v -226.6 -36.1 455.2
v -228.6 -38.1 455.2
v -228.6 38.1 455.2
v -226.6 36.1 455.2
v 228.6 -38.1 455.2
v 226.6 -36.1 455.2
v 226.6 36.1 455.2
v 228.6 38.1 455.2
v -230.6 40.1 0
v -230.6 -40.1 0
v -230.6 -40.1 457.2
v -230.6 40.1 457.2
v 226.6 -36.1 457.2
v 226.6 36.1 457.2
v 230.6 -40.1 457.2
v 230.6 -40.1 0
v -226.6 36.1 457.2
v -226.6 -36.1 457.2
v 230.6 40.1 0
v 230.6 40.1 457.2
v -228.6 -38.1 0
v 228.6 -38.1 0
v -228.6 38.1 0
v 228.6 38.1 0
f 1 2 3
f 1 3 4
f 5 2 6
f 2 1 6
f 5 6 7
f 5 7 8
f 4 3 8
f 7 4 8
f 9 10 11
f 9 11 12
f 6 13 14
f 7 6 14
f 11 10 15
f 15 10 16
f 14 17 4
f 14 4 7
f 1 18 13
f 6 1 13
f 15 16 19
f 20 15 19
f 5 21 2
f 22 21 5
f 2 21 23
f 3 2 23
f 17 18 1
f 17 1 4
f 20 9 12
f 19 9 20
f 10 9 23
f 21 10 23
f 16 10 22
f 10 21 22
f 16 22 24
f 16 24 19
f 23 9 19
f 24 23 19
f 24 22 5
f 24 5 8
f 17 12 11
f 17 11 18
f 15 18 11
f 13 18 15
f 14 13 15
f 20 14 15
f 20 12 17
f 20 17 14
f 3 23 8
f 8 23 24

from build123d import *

# Parameters (mm, degrees)
SKETCH_1_W        = 461.2
SKETCH_1_H        = 80.2
SKETCH_1_W_2      = 457.2
SKETCH_1_H_2      = 76.2
EXTRUDE_1_DEPTH   = 457.2
SKETCH_2_W        = 461.2
SKETCH_2_H        = 80.2
SKETCH_2_W_2      = 453.2
SKETCH_2_H_2      = 72.2
EXTRUDE_1_2_DEPTH = 2


with BuildPart() as part:
    # Эскиз1 → Extrude 1 (new body)
    with BuildSketch(Plane.XY):
        Rectangle(SKETCH_1_W, SKETCH_1_H)
        Rectangle(SKETCH_1_W_2, SKETCH_1_H_2, mode=Mode.SUBTRACT)
    extrude(amount=EXTRUDE_1_DEPTH)

    # Эскиз2 → Extrude 1 2 (add)
    with BuildSketch(Plane.XY.offset(457.2)):
        Rectangle(SKETCH_2_W, SKETCH_2_H)
        Rectangle(SKETCH_2_W_2, SKETCH_2_H_2, mode=Mode.SUBTRACT)
    extrude(amount=-EXTRUDE_1_2_DEPTH)


solid = part.part
